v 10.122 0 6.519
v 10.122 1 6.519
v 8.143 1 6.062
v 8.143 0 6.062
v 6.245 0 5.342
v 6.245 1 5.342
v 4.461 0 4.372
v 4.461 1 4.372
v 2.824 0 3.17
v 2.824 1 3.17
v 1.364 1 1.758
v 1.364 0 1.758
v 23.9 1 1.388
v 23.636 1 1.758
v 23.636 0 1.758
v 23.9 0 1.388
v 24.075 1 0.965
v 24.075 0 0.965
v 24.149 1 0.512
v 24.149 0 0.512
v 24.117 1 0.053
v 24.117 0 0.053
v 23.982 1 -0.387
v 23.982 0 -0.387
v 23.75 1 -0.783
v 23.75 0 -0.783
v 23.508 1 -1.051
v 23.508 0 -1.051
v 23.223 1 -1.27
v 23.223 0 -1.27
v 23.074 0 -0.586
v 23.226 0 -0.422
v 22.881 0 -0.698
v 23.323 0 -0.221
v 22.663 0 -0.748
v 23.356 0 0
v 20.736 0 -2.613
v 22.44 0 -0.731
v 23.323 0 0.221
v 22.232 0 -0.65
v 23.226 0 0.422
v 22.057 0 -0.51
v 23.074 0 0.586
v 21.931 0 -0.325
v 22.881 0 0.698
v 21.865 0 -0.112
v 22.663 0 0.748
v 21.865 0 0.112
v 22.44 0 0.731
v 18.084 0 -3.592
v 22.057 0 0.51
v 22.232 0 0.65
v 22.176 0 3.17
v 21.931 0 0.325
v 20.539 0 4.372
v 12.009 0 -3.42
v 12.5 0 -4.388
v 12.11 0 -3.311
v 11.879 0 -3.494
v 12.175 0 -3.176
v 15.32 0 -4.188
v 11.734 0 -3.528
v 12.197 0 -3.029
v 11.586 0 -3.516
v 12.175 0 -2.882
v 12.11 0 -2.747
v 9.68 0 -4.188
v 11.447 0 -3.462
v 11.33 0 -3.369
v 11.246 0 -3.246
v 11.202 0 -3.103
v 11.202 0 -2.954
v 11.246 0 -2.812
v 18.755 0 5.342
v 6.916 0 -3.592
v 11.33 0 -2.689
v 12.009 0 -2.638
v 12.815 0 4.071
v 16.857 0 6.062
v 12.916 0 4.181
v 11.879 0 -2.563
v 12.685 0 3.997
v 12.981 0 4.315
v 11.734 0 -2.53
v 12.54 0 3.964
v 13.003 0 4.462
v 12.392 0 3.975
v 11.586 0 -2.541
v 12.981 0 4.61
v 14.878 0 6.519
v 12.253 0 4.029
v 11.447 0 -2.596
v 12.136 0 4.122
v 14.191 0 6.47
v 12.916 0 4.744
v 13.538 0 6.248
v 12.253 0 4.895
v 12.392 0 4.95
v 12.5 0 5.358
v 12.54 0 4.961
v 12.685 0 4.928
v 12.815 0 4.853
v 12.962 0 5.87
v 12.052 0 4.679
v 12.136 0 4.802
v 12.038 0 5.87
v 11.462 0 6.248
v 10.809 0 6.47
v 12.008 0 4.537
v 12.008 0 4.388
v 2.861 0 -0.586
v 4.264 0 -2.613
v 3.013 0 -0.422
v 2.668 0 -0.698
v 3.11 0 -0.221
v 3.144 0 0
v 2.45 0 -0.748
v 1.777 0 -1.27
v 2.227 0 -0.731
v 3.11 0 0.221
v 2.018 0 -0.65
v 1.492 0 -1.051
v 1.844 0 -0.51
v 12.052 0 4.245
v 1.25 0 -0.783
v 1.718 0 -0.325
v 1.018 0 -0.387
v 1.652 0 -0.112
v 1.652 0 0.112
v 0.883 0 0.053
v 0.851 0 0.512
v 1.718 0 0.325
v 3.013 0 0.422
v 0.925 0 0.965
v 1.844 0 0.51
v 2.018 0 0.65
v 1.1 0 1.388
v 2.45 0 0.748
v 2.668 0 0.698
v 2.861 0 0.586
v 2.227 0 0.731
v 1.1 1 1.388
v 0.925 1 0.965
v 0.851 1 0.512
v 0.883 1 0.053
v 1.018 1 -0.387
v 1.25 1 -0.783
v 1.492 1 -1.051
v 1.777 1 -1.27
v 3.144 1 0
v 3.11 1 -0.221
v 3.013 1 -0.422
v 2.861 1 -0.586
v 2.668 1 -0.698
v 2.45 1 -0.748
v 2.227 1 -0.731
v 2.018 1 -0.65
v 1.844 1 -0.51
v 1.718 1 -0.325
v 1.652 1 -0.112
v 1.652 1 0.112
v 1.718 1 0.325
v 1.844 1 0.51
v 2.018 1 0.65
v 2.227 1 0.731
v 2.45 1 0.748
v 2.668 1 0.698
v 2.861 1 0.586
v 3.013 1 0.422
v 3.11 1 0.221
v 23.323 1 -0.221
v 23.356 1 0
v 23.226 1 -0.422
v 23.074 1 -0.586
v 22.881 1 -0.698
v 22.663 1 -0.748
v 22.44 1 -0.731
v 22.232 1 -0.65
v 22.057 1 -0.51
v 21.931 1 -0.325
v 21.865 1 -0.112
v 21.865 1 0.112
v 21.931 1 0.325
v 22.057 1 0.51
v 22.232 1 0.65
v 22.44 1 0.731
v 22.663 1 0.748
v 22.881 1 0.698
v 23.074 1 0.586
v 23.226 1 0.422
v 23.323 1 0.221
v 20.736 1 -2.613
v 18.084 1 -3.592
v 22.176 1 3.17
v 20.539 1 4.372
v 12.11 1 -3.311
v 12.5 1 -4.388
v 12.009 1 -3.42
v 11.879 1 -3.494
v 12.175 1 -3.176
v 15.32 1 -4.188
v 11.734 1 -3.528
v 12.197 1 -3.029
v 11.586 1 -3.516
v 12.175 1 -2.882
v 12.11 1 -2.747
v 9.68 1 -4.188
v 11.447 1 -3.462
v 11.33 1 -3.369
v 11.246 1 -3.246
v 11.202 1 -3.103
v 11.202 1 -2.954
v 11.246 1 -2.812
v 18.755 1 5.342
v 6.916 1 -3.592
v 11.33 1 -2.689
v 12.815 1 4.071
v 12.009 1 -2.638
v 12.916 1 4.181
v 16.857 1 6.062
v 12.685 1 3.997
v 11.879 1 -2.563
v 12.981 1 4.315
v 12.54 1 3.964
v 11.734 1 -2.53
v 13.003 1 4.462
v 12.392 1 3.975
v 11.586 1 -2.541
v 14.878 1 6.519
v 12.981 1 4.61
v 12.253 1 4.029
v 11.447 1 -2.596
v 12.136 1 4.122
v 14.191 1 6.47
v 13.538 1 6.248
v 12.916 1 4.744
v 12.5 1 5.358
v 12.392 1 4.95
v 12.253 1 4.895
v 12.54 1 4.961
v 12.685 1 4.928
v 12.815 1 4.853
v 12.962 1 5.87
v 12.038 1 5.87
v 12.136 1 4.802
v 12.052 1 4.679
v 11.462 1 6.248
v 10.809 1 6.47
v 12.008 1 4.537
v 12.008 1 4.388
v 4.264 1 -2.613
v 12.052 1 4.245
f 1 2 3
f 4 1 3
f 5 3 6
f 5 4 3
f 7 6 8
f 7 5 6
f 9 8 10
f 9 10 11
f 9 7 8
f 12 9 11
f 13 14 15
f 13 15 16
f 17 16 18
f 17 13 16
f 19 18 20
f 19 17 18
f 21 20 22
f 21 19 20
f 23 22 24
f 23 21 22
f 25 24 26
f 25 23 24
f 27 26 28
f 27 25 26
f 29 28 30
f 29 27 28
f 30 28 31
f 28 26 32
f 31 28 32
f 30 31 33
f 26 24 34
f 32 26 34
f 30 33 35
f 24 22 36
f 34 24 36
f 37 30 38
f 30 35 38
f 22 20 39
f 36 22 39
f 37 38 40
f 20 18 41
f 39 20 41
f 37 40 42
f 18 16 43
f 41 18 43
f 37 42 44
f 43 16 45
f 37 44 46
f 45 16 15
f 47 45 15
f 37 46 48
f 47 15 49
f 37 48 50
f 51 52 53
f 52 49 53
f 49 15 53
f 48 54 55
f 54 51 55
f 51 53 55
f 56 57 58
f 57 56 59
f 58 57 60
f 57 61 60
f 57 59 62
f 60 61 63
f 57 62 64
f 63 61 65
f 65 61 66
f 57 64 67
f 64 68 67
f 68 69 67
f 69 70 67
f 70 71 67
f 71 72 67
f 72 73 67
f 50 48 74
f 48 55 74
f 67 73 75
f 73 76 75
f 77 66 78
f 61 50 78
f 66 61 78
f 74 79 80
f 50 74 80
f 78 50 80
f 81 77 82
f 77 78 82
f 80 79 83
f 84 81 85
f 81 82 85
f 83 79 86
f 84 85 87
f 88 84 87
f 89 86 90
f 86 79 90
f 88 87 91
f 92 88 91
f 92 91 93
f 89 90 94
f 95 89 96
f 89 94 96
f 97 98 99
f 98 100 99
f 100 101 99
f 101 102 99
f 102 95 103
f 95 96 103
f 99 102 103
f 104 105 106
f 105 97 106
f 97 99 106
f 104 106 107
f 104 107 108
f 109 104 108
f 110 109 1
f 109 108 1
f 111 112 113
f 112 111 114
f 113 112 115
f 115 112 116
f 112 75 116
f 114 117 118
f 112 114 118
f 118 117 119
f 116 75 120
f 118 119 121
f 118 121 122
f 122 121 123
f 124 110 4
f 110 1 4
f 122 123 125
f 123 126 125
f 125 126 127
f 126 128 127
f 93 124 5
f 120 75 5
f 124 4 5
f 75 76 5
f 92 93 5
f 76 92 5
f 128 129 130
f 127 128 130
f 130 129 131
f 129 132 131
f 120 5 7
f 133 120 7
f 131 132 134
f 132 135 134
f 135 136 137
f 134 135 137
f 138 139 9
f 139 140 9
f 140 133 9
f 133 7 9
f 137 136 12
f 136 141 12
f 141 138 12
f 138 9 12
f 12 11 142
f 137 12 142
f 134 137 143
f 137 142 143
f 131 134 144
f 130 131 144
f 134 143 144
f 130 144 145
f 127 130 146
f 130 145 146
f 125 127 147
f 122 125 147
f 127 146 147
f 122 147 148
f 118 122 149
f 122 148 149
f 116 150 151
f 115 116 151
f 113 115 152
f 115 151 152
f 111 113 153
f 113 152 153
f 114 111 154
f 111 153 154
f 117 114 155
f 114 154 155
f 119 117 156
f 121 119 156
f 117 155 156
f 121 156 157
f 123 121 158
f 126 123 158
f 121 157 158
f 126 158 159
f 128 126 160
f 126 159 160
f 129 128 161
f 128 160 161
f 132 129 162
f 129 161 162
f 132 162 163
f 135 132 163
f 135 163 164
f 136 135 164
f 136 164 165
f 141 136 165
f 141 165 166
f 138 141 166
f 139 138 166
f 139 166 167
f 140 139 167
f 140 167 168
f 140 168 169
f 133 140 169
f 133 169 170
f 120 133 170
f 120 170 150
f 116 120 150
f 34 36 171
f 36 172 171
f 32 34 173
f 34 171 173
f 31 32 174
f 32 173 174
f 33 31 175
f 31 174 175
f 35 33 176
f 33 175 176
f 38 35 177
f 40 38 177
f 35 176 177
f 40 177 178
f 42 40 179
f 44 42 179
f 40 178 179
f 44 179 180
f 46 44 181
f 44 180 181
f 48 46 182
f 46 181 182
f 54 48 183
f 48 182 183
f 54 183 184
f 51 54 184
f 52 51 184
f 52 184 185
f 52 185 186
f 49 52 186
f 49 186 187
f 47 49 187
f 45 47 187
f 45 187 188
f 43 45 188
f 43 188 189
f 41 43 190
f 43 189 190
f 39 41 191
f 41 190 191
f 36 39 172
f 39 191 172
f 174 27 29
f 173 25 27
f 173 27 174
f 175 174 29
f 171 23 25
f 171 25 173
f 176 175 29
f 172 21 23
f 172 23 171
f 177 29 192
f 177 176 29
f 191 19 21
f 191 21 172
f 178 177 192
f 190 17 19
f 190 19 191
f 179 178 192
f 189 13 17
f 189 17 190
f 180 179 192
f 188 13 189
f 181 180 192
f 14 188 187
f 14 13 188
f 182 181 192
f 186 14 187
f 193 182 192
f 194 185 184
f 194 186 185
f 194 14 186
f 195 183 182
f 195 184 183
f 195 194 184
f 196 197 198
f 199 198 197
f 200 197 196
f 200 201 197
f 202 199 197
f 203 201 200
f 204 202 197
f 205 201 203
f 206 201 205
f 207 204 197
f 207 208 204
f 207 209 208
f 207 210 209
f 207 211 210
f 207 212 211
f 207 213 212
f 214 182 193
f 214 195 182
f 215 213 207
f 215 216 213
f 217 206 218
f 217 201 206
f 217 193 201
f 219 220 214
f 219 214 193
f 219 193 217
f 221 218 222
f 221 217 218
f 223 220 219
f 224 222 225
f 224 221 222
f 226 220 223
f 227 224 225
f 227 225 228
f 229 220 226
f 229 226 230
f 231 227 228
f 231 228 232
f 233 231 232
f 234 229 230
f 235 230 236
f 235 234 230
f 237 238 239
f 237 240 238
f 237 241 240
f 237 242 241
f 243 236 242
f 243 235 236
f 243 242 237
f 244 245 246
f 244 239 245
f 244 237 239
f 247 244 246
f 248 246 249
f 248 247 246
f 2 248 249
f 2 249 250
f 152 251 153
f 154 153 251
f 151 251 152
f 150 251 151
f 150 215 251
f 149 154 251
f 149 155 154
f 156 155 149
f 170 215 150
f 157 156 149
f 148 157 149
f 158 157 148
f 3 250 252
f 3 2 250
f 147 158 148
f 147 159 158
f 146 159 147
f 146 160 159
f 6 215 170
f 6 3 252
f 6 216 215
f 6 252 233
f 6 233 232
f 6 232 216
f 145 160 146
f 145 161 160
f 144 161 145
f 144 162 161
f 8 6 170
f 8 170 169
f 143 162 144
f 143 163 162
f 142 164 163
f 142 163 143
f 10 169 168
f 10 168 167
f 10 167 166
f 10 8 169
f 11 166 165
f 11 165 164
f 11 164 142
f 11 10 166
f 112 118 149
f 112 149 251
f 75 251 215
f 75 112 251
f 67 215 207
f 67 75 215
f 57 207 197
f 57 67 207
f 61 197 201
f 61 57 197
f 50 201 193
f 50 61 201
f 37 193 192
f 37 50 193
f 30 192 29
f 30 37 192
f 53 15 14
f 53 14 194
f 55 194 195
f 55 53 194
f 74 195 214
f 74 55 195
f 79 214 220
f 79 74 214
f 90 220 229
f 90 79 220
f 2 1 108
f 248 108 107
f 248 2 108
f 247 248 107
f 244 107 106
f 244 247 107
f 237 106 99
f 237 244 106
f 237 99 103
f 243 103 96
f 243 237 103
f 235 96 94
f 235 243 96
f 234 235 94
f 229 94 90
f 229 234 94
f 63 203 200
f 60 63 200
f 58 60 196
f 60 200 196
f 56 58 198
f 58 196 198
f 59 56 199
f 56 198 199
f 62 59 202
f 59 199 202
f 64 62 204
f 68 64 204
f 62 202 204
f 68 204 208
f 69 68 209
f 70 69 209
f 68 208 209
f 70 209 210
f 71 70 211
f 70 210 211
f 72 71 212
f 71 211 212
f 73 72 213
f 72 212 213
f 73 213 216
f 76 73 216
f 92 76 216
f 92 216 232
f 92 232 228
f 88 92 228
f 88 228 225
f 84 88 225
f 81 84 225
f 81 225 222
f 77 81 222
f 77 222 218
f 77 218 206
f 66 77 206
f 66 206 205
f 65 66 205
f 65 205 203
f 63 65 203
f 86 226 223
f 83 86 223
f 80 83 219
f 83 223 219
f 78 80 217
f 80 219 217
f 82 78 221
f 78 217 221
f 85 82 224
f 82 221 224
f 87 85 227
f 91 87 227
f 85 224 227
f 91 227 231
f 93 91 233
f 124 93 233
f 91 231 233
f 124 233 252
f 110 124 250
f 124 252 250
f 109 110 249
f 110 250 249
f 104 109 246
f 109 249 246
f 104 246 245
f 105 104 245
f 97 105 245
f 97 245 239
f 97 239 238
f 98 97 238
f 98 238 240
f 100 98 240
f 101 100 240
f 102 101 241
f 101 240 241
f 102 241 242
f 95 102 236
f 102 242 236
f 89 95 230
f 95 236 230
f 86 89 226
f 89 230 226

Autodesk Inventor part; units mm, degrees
ref_plane "YZ Plane" through (0, 0, 0) normal (1, 0, 0) x (0, 1, 0)
ref_plane "XZ Plane" through (0, 0, 0) normal (0, 1, 0) x (-1, 0, 0)
ref_plane "XY Plane" through (0, 0, 0) normal (0, 0, 1) x (1, 0, 0)
sketch "Sketch1" plane through (0, 0, 0) normal (0, 1, 0) x (-1, 0, 0)
  arc A0 (-25, 0) -> (0, 0) centre (-12.5, 15.6125) ccw
  arc A1 (0, 0) -> (-25, 0) centre (-12.5, -8.2916) ccw
  dimension "d0" = 25
  dimension "d1" = 20
  dimension "d2" = 15
extrude "Extrusion1" add sketch "Sketch1" along normal blind 1
fillet "Fillet1" radius 2 2 edges at (25, 0.5, 0) (0, 0.5, 0)
sketch "Sketch2" plane through (0, 1, 0) normal (0, 1, 0) x (1, 0, 0)
  arc A0 (1.3645, -1.7583) -> (23.6355, -1.7583) centre (12.5, 8.2916) ccw projected
  arc A1 (1.3645, -1.7583) -> (23.6355, -1.7583) centre (12.5, 8.2916) ccw projected
  arc A2 (9.4548, -6.3961) -> (12.5, -5.3578) centre (10.2741, -3.8143) ccw
  arc A3 (12.5, -5.3578) -> (15.5452, -6.3961) centre (14.7259, -3.8143) ccw
  line L0 (9.4548, -6.3961) -> (10.705, -7.1711)
  line L1 (10.705, -7.1711) -> (14.8328, -7.2667)
  line L2 (14.8328, -7.2667) -> (15.5452, -6.3961)
  point P0 (0, 0)
extrude "Extrusion2" cut sketch "Sketch2" against normal blind 1 contours A2 A0 A3 L2 L1 L0 | A2 A3 A0
sketch "Sketch3" plane through (0, 1, 0) normal (0, 1, 0) x (1, 0, 0)
  arc A0 (1.7769, 1.2699) -> (1.3645, -1.7583) centre (2.8492, -0.4183) ccw projected
  line L0 (0.8935, 0) -> (2.3935, 0)
  arc A1 (23.6355, -1.7583) -> (23.2231, 1.2699) centre (22.1508, -0.4183) ccw projected
  line L1 (24.1065, 0) -> (22.6065, 0)
  circle A2 centre (2.3935, 0) radius 0.75
  circle A3 centre (22.6065, 0) radius 0.75
  circle A4 centre (11.6968, 3.0289) radius 0.5
  point P0 (0, 0)
  dimension "d10" = 1.5
  dimension "d11" = 1.5
  dimension "d12" = 1.5
  dimension "d13" = 1.5
  dimension "d14" = 1
extrude "Extrusion3" cut sketch "Sketch3" against normal blind 1
sketch "Sketch4" plane through (0, 1, 0) normal (0, 1, 0) x (1, 0, 0)
  circle A0 centre (12.5028, -4.4622) radius 0.5
  point P0 (0, 0)
  dimension "d17" = 1
extrude "Extrusion4" cut sketch "Sketch4" against normal blind 1
properties part number "nariz"
